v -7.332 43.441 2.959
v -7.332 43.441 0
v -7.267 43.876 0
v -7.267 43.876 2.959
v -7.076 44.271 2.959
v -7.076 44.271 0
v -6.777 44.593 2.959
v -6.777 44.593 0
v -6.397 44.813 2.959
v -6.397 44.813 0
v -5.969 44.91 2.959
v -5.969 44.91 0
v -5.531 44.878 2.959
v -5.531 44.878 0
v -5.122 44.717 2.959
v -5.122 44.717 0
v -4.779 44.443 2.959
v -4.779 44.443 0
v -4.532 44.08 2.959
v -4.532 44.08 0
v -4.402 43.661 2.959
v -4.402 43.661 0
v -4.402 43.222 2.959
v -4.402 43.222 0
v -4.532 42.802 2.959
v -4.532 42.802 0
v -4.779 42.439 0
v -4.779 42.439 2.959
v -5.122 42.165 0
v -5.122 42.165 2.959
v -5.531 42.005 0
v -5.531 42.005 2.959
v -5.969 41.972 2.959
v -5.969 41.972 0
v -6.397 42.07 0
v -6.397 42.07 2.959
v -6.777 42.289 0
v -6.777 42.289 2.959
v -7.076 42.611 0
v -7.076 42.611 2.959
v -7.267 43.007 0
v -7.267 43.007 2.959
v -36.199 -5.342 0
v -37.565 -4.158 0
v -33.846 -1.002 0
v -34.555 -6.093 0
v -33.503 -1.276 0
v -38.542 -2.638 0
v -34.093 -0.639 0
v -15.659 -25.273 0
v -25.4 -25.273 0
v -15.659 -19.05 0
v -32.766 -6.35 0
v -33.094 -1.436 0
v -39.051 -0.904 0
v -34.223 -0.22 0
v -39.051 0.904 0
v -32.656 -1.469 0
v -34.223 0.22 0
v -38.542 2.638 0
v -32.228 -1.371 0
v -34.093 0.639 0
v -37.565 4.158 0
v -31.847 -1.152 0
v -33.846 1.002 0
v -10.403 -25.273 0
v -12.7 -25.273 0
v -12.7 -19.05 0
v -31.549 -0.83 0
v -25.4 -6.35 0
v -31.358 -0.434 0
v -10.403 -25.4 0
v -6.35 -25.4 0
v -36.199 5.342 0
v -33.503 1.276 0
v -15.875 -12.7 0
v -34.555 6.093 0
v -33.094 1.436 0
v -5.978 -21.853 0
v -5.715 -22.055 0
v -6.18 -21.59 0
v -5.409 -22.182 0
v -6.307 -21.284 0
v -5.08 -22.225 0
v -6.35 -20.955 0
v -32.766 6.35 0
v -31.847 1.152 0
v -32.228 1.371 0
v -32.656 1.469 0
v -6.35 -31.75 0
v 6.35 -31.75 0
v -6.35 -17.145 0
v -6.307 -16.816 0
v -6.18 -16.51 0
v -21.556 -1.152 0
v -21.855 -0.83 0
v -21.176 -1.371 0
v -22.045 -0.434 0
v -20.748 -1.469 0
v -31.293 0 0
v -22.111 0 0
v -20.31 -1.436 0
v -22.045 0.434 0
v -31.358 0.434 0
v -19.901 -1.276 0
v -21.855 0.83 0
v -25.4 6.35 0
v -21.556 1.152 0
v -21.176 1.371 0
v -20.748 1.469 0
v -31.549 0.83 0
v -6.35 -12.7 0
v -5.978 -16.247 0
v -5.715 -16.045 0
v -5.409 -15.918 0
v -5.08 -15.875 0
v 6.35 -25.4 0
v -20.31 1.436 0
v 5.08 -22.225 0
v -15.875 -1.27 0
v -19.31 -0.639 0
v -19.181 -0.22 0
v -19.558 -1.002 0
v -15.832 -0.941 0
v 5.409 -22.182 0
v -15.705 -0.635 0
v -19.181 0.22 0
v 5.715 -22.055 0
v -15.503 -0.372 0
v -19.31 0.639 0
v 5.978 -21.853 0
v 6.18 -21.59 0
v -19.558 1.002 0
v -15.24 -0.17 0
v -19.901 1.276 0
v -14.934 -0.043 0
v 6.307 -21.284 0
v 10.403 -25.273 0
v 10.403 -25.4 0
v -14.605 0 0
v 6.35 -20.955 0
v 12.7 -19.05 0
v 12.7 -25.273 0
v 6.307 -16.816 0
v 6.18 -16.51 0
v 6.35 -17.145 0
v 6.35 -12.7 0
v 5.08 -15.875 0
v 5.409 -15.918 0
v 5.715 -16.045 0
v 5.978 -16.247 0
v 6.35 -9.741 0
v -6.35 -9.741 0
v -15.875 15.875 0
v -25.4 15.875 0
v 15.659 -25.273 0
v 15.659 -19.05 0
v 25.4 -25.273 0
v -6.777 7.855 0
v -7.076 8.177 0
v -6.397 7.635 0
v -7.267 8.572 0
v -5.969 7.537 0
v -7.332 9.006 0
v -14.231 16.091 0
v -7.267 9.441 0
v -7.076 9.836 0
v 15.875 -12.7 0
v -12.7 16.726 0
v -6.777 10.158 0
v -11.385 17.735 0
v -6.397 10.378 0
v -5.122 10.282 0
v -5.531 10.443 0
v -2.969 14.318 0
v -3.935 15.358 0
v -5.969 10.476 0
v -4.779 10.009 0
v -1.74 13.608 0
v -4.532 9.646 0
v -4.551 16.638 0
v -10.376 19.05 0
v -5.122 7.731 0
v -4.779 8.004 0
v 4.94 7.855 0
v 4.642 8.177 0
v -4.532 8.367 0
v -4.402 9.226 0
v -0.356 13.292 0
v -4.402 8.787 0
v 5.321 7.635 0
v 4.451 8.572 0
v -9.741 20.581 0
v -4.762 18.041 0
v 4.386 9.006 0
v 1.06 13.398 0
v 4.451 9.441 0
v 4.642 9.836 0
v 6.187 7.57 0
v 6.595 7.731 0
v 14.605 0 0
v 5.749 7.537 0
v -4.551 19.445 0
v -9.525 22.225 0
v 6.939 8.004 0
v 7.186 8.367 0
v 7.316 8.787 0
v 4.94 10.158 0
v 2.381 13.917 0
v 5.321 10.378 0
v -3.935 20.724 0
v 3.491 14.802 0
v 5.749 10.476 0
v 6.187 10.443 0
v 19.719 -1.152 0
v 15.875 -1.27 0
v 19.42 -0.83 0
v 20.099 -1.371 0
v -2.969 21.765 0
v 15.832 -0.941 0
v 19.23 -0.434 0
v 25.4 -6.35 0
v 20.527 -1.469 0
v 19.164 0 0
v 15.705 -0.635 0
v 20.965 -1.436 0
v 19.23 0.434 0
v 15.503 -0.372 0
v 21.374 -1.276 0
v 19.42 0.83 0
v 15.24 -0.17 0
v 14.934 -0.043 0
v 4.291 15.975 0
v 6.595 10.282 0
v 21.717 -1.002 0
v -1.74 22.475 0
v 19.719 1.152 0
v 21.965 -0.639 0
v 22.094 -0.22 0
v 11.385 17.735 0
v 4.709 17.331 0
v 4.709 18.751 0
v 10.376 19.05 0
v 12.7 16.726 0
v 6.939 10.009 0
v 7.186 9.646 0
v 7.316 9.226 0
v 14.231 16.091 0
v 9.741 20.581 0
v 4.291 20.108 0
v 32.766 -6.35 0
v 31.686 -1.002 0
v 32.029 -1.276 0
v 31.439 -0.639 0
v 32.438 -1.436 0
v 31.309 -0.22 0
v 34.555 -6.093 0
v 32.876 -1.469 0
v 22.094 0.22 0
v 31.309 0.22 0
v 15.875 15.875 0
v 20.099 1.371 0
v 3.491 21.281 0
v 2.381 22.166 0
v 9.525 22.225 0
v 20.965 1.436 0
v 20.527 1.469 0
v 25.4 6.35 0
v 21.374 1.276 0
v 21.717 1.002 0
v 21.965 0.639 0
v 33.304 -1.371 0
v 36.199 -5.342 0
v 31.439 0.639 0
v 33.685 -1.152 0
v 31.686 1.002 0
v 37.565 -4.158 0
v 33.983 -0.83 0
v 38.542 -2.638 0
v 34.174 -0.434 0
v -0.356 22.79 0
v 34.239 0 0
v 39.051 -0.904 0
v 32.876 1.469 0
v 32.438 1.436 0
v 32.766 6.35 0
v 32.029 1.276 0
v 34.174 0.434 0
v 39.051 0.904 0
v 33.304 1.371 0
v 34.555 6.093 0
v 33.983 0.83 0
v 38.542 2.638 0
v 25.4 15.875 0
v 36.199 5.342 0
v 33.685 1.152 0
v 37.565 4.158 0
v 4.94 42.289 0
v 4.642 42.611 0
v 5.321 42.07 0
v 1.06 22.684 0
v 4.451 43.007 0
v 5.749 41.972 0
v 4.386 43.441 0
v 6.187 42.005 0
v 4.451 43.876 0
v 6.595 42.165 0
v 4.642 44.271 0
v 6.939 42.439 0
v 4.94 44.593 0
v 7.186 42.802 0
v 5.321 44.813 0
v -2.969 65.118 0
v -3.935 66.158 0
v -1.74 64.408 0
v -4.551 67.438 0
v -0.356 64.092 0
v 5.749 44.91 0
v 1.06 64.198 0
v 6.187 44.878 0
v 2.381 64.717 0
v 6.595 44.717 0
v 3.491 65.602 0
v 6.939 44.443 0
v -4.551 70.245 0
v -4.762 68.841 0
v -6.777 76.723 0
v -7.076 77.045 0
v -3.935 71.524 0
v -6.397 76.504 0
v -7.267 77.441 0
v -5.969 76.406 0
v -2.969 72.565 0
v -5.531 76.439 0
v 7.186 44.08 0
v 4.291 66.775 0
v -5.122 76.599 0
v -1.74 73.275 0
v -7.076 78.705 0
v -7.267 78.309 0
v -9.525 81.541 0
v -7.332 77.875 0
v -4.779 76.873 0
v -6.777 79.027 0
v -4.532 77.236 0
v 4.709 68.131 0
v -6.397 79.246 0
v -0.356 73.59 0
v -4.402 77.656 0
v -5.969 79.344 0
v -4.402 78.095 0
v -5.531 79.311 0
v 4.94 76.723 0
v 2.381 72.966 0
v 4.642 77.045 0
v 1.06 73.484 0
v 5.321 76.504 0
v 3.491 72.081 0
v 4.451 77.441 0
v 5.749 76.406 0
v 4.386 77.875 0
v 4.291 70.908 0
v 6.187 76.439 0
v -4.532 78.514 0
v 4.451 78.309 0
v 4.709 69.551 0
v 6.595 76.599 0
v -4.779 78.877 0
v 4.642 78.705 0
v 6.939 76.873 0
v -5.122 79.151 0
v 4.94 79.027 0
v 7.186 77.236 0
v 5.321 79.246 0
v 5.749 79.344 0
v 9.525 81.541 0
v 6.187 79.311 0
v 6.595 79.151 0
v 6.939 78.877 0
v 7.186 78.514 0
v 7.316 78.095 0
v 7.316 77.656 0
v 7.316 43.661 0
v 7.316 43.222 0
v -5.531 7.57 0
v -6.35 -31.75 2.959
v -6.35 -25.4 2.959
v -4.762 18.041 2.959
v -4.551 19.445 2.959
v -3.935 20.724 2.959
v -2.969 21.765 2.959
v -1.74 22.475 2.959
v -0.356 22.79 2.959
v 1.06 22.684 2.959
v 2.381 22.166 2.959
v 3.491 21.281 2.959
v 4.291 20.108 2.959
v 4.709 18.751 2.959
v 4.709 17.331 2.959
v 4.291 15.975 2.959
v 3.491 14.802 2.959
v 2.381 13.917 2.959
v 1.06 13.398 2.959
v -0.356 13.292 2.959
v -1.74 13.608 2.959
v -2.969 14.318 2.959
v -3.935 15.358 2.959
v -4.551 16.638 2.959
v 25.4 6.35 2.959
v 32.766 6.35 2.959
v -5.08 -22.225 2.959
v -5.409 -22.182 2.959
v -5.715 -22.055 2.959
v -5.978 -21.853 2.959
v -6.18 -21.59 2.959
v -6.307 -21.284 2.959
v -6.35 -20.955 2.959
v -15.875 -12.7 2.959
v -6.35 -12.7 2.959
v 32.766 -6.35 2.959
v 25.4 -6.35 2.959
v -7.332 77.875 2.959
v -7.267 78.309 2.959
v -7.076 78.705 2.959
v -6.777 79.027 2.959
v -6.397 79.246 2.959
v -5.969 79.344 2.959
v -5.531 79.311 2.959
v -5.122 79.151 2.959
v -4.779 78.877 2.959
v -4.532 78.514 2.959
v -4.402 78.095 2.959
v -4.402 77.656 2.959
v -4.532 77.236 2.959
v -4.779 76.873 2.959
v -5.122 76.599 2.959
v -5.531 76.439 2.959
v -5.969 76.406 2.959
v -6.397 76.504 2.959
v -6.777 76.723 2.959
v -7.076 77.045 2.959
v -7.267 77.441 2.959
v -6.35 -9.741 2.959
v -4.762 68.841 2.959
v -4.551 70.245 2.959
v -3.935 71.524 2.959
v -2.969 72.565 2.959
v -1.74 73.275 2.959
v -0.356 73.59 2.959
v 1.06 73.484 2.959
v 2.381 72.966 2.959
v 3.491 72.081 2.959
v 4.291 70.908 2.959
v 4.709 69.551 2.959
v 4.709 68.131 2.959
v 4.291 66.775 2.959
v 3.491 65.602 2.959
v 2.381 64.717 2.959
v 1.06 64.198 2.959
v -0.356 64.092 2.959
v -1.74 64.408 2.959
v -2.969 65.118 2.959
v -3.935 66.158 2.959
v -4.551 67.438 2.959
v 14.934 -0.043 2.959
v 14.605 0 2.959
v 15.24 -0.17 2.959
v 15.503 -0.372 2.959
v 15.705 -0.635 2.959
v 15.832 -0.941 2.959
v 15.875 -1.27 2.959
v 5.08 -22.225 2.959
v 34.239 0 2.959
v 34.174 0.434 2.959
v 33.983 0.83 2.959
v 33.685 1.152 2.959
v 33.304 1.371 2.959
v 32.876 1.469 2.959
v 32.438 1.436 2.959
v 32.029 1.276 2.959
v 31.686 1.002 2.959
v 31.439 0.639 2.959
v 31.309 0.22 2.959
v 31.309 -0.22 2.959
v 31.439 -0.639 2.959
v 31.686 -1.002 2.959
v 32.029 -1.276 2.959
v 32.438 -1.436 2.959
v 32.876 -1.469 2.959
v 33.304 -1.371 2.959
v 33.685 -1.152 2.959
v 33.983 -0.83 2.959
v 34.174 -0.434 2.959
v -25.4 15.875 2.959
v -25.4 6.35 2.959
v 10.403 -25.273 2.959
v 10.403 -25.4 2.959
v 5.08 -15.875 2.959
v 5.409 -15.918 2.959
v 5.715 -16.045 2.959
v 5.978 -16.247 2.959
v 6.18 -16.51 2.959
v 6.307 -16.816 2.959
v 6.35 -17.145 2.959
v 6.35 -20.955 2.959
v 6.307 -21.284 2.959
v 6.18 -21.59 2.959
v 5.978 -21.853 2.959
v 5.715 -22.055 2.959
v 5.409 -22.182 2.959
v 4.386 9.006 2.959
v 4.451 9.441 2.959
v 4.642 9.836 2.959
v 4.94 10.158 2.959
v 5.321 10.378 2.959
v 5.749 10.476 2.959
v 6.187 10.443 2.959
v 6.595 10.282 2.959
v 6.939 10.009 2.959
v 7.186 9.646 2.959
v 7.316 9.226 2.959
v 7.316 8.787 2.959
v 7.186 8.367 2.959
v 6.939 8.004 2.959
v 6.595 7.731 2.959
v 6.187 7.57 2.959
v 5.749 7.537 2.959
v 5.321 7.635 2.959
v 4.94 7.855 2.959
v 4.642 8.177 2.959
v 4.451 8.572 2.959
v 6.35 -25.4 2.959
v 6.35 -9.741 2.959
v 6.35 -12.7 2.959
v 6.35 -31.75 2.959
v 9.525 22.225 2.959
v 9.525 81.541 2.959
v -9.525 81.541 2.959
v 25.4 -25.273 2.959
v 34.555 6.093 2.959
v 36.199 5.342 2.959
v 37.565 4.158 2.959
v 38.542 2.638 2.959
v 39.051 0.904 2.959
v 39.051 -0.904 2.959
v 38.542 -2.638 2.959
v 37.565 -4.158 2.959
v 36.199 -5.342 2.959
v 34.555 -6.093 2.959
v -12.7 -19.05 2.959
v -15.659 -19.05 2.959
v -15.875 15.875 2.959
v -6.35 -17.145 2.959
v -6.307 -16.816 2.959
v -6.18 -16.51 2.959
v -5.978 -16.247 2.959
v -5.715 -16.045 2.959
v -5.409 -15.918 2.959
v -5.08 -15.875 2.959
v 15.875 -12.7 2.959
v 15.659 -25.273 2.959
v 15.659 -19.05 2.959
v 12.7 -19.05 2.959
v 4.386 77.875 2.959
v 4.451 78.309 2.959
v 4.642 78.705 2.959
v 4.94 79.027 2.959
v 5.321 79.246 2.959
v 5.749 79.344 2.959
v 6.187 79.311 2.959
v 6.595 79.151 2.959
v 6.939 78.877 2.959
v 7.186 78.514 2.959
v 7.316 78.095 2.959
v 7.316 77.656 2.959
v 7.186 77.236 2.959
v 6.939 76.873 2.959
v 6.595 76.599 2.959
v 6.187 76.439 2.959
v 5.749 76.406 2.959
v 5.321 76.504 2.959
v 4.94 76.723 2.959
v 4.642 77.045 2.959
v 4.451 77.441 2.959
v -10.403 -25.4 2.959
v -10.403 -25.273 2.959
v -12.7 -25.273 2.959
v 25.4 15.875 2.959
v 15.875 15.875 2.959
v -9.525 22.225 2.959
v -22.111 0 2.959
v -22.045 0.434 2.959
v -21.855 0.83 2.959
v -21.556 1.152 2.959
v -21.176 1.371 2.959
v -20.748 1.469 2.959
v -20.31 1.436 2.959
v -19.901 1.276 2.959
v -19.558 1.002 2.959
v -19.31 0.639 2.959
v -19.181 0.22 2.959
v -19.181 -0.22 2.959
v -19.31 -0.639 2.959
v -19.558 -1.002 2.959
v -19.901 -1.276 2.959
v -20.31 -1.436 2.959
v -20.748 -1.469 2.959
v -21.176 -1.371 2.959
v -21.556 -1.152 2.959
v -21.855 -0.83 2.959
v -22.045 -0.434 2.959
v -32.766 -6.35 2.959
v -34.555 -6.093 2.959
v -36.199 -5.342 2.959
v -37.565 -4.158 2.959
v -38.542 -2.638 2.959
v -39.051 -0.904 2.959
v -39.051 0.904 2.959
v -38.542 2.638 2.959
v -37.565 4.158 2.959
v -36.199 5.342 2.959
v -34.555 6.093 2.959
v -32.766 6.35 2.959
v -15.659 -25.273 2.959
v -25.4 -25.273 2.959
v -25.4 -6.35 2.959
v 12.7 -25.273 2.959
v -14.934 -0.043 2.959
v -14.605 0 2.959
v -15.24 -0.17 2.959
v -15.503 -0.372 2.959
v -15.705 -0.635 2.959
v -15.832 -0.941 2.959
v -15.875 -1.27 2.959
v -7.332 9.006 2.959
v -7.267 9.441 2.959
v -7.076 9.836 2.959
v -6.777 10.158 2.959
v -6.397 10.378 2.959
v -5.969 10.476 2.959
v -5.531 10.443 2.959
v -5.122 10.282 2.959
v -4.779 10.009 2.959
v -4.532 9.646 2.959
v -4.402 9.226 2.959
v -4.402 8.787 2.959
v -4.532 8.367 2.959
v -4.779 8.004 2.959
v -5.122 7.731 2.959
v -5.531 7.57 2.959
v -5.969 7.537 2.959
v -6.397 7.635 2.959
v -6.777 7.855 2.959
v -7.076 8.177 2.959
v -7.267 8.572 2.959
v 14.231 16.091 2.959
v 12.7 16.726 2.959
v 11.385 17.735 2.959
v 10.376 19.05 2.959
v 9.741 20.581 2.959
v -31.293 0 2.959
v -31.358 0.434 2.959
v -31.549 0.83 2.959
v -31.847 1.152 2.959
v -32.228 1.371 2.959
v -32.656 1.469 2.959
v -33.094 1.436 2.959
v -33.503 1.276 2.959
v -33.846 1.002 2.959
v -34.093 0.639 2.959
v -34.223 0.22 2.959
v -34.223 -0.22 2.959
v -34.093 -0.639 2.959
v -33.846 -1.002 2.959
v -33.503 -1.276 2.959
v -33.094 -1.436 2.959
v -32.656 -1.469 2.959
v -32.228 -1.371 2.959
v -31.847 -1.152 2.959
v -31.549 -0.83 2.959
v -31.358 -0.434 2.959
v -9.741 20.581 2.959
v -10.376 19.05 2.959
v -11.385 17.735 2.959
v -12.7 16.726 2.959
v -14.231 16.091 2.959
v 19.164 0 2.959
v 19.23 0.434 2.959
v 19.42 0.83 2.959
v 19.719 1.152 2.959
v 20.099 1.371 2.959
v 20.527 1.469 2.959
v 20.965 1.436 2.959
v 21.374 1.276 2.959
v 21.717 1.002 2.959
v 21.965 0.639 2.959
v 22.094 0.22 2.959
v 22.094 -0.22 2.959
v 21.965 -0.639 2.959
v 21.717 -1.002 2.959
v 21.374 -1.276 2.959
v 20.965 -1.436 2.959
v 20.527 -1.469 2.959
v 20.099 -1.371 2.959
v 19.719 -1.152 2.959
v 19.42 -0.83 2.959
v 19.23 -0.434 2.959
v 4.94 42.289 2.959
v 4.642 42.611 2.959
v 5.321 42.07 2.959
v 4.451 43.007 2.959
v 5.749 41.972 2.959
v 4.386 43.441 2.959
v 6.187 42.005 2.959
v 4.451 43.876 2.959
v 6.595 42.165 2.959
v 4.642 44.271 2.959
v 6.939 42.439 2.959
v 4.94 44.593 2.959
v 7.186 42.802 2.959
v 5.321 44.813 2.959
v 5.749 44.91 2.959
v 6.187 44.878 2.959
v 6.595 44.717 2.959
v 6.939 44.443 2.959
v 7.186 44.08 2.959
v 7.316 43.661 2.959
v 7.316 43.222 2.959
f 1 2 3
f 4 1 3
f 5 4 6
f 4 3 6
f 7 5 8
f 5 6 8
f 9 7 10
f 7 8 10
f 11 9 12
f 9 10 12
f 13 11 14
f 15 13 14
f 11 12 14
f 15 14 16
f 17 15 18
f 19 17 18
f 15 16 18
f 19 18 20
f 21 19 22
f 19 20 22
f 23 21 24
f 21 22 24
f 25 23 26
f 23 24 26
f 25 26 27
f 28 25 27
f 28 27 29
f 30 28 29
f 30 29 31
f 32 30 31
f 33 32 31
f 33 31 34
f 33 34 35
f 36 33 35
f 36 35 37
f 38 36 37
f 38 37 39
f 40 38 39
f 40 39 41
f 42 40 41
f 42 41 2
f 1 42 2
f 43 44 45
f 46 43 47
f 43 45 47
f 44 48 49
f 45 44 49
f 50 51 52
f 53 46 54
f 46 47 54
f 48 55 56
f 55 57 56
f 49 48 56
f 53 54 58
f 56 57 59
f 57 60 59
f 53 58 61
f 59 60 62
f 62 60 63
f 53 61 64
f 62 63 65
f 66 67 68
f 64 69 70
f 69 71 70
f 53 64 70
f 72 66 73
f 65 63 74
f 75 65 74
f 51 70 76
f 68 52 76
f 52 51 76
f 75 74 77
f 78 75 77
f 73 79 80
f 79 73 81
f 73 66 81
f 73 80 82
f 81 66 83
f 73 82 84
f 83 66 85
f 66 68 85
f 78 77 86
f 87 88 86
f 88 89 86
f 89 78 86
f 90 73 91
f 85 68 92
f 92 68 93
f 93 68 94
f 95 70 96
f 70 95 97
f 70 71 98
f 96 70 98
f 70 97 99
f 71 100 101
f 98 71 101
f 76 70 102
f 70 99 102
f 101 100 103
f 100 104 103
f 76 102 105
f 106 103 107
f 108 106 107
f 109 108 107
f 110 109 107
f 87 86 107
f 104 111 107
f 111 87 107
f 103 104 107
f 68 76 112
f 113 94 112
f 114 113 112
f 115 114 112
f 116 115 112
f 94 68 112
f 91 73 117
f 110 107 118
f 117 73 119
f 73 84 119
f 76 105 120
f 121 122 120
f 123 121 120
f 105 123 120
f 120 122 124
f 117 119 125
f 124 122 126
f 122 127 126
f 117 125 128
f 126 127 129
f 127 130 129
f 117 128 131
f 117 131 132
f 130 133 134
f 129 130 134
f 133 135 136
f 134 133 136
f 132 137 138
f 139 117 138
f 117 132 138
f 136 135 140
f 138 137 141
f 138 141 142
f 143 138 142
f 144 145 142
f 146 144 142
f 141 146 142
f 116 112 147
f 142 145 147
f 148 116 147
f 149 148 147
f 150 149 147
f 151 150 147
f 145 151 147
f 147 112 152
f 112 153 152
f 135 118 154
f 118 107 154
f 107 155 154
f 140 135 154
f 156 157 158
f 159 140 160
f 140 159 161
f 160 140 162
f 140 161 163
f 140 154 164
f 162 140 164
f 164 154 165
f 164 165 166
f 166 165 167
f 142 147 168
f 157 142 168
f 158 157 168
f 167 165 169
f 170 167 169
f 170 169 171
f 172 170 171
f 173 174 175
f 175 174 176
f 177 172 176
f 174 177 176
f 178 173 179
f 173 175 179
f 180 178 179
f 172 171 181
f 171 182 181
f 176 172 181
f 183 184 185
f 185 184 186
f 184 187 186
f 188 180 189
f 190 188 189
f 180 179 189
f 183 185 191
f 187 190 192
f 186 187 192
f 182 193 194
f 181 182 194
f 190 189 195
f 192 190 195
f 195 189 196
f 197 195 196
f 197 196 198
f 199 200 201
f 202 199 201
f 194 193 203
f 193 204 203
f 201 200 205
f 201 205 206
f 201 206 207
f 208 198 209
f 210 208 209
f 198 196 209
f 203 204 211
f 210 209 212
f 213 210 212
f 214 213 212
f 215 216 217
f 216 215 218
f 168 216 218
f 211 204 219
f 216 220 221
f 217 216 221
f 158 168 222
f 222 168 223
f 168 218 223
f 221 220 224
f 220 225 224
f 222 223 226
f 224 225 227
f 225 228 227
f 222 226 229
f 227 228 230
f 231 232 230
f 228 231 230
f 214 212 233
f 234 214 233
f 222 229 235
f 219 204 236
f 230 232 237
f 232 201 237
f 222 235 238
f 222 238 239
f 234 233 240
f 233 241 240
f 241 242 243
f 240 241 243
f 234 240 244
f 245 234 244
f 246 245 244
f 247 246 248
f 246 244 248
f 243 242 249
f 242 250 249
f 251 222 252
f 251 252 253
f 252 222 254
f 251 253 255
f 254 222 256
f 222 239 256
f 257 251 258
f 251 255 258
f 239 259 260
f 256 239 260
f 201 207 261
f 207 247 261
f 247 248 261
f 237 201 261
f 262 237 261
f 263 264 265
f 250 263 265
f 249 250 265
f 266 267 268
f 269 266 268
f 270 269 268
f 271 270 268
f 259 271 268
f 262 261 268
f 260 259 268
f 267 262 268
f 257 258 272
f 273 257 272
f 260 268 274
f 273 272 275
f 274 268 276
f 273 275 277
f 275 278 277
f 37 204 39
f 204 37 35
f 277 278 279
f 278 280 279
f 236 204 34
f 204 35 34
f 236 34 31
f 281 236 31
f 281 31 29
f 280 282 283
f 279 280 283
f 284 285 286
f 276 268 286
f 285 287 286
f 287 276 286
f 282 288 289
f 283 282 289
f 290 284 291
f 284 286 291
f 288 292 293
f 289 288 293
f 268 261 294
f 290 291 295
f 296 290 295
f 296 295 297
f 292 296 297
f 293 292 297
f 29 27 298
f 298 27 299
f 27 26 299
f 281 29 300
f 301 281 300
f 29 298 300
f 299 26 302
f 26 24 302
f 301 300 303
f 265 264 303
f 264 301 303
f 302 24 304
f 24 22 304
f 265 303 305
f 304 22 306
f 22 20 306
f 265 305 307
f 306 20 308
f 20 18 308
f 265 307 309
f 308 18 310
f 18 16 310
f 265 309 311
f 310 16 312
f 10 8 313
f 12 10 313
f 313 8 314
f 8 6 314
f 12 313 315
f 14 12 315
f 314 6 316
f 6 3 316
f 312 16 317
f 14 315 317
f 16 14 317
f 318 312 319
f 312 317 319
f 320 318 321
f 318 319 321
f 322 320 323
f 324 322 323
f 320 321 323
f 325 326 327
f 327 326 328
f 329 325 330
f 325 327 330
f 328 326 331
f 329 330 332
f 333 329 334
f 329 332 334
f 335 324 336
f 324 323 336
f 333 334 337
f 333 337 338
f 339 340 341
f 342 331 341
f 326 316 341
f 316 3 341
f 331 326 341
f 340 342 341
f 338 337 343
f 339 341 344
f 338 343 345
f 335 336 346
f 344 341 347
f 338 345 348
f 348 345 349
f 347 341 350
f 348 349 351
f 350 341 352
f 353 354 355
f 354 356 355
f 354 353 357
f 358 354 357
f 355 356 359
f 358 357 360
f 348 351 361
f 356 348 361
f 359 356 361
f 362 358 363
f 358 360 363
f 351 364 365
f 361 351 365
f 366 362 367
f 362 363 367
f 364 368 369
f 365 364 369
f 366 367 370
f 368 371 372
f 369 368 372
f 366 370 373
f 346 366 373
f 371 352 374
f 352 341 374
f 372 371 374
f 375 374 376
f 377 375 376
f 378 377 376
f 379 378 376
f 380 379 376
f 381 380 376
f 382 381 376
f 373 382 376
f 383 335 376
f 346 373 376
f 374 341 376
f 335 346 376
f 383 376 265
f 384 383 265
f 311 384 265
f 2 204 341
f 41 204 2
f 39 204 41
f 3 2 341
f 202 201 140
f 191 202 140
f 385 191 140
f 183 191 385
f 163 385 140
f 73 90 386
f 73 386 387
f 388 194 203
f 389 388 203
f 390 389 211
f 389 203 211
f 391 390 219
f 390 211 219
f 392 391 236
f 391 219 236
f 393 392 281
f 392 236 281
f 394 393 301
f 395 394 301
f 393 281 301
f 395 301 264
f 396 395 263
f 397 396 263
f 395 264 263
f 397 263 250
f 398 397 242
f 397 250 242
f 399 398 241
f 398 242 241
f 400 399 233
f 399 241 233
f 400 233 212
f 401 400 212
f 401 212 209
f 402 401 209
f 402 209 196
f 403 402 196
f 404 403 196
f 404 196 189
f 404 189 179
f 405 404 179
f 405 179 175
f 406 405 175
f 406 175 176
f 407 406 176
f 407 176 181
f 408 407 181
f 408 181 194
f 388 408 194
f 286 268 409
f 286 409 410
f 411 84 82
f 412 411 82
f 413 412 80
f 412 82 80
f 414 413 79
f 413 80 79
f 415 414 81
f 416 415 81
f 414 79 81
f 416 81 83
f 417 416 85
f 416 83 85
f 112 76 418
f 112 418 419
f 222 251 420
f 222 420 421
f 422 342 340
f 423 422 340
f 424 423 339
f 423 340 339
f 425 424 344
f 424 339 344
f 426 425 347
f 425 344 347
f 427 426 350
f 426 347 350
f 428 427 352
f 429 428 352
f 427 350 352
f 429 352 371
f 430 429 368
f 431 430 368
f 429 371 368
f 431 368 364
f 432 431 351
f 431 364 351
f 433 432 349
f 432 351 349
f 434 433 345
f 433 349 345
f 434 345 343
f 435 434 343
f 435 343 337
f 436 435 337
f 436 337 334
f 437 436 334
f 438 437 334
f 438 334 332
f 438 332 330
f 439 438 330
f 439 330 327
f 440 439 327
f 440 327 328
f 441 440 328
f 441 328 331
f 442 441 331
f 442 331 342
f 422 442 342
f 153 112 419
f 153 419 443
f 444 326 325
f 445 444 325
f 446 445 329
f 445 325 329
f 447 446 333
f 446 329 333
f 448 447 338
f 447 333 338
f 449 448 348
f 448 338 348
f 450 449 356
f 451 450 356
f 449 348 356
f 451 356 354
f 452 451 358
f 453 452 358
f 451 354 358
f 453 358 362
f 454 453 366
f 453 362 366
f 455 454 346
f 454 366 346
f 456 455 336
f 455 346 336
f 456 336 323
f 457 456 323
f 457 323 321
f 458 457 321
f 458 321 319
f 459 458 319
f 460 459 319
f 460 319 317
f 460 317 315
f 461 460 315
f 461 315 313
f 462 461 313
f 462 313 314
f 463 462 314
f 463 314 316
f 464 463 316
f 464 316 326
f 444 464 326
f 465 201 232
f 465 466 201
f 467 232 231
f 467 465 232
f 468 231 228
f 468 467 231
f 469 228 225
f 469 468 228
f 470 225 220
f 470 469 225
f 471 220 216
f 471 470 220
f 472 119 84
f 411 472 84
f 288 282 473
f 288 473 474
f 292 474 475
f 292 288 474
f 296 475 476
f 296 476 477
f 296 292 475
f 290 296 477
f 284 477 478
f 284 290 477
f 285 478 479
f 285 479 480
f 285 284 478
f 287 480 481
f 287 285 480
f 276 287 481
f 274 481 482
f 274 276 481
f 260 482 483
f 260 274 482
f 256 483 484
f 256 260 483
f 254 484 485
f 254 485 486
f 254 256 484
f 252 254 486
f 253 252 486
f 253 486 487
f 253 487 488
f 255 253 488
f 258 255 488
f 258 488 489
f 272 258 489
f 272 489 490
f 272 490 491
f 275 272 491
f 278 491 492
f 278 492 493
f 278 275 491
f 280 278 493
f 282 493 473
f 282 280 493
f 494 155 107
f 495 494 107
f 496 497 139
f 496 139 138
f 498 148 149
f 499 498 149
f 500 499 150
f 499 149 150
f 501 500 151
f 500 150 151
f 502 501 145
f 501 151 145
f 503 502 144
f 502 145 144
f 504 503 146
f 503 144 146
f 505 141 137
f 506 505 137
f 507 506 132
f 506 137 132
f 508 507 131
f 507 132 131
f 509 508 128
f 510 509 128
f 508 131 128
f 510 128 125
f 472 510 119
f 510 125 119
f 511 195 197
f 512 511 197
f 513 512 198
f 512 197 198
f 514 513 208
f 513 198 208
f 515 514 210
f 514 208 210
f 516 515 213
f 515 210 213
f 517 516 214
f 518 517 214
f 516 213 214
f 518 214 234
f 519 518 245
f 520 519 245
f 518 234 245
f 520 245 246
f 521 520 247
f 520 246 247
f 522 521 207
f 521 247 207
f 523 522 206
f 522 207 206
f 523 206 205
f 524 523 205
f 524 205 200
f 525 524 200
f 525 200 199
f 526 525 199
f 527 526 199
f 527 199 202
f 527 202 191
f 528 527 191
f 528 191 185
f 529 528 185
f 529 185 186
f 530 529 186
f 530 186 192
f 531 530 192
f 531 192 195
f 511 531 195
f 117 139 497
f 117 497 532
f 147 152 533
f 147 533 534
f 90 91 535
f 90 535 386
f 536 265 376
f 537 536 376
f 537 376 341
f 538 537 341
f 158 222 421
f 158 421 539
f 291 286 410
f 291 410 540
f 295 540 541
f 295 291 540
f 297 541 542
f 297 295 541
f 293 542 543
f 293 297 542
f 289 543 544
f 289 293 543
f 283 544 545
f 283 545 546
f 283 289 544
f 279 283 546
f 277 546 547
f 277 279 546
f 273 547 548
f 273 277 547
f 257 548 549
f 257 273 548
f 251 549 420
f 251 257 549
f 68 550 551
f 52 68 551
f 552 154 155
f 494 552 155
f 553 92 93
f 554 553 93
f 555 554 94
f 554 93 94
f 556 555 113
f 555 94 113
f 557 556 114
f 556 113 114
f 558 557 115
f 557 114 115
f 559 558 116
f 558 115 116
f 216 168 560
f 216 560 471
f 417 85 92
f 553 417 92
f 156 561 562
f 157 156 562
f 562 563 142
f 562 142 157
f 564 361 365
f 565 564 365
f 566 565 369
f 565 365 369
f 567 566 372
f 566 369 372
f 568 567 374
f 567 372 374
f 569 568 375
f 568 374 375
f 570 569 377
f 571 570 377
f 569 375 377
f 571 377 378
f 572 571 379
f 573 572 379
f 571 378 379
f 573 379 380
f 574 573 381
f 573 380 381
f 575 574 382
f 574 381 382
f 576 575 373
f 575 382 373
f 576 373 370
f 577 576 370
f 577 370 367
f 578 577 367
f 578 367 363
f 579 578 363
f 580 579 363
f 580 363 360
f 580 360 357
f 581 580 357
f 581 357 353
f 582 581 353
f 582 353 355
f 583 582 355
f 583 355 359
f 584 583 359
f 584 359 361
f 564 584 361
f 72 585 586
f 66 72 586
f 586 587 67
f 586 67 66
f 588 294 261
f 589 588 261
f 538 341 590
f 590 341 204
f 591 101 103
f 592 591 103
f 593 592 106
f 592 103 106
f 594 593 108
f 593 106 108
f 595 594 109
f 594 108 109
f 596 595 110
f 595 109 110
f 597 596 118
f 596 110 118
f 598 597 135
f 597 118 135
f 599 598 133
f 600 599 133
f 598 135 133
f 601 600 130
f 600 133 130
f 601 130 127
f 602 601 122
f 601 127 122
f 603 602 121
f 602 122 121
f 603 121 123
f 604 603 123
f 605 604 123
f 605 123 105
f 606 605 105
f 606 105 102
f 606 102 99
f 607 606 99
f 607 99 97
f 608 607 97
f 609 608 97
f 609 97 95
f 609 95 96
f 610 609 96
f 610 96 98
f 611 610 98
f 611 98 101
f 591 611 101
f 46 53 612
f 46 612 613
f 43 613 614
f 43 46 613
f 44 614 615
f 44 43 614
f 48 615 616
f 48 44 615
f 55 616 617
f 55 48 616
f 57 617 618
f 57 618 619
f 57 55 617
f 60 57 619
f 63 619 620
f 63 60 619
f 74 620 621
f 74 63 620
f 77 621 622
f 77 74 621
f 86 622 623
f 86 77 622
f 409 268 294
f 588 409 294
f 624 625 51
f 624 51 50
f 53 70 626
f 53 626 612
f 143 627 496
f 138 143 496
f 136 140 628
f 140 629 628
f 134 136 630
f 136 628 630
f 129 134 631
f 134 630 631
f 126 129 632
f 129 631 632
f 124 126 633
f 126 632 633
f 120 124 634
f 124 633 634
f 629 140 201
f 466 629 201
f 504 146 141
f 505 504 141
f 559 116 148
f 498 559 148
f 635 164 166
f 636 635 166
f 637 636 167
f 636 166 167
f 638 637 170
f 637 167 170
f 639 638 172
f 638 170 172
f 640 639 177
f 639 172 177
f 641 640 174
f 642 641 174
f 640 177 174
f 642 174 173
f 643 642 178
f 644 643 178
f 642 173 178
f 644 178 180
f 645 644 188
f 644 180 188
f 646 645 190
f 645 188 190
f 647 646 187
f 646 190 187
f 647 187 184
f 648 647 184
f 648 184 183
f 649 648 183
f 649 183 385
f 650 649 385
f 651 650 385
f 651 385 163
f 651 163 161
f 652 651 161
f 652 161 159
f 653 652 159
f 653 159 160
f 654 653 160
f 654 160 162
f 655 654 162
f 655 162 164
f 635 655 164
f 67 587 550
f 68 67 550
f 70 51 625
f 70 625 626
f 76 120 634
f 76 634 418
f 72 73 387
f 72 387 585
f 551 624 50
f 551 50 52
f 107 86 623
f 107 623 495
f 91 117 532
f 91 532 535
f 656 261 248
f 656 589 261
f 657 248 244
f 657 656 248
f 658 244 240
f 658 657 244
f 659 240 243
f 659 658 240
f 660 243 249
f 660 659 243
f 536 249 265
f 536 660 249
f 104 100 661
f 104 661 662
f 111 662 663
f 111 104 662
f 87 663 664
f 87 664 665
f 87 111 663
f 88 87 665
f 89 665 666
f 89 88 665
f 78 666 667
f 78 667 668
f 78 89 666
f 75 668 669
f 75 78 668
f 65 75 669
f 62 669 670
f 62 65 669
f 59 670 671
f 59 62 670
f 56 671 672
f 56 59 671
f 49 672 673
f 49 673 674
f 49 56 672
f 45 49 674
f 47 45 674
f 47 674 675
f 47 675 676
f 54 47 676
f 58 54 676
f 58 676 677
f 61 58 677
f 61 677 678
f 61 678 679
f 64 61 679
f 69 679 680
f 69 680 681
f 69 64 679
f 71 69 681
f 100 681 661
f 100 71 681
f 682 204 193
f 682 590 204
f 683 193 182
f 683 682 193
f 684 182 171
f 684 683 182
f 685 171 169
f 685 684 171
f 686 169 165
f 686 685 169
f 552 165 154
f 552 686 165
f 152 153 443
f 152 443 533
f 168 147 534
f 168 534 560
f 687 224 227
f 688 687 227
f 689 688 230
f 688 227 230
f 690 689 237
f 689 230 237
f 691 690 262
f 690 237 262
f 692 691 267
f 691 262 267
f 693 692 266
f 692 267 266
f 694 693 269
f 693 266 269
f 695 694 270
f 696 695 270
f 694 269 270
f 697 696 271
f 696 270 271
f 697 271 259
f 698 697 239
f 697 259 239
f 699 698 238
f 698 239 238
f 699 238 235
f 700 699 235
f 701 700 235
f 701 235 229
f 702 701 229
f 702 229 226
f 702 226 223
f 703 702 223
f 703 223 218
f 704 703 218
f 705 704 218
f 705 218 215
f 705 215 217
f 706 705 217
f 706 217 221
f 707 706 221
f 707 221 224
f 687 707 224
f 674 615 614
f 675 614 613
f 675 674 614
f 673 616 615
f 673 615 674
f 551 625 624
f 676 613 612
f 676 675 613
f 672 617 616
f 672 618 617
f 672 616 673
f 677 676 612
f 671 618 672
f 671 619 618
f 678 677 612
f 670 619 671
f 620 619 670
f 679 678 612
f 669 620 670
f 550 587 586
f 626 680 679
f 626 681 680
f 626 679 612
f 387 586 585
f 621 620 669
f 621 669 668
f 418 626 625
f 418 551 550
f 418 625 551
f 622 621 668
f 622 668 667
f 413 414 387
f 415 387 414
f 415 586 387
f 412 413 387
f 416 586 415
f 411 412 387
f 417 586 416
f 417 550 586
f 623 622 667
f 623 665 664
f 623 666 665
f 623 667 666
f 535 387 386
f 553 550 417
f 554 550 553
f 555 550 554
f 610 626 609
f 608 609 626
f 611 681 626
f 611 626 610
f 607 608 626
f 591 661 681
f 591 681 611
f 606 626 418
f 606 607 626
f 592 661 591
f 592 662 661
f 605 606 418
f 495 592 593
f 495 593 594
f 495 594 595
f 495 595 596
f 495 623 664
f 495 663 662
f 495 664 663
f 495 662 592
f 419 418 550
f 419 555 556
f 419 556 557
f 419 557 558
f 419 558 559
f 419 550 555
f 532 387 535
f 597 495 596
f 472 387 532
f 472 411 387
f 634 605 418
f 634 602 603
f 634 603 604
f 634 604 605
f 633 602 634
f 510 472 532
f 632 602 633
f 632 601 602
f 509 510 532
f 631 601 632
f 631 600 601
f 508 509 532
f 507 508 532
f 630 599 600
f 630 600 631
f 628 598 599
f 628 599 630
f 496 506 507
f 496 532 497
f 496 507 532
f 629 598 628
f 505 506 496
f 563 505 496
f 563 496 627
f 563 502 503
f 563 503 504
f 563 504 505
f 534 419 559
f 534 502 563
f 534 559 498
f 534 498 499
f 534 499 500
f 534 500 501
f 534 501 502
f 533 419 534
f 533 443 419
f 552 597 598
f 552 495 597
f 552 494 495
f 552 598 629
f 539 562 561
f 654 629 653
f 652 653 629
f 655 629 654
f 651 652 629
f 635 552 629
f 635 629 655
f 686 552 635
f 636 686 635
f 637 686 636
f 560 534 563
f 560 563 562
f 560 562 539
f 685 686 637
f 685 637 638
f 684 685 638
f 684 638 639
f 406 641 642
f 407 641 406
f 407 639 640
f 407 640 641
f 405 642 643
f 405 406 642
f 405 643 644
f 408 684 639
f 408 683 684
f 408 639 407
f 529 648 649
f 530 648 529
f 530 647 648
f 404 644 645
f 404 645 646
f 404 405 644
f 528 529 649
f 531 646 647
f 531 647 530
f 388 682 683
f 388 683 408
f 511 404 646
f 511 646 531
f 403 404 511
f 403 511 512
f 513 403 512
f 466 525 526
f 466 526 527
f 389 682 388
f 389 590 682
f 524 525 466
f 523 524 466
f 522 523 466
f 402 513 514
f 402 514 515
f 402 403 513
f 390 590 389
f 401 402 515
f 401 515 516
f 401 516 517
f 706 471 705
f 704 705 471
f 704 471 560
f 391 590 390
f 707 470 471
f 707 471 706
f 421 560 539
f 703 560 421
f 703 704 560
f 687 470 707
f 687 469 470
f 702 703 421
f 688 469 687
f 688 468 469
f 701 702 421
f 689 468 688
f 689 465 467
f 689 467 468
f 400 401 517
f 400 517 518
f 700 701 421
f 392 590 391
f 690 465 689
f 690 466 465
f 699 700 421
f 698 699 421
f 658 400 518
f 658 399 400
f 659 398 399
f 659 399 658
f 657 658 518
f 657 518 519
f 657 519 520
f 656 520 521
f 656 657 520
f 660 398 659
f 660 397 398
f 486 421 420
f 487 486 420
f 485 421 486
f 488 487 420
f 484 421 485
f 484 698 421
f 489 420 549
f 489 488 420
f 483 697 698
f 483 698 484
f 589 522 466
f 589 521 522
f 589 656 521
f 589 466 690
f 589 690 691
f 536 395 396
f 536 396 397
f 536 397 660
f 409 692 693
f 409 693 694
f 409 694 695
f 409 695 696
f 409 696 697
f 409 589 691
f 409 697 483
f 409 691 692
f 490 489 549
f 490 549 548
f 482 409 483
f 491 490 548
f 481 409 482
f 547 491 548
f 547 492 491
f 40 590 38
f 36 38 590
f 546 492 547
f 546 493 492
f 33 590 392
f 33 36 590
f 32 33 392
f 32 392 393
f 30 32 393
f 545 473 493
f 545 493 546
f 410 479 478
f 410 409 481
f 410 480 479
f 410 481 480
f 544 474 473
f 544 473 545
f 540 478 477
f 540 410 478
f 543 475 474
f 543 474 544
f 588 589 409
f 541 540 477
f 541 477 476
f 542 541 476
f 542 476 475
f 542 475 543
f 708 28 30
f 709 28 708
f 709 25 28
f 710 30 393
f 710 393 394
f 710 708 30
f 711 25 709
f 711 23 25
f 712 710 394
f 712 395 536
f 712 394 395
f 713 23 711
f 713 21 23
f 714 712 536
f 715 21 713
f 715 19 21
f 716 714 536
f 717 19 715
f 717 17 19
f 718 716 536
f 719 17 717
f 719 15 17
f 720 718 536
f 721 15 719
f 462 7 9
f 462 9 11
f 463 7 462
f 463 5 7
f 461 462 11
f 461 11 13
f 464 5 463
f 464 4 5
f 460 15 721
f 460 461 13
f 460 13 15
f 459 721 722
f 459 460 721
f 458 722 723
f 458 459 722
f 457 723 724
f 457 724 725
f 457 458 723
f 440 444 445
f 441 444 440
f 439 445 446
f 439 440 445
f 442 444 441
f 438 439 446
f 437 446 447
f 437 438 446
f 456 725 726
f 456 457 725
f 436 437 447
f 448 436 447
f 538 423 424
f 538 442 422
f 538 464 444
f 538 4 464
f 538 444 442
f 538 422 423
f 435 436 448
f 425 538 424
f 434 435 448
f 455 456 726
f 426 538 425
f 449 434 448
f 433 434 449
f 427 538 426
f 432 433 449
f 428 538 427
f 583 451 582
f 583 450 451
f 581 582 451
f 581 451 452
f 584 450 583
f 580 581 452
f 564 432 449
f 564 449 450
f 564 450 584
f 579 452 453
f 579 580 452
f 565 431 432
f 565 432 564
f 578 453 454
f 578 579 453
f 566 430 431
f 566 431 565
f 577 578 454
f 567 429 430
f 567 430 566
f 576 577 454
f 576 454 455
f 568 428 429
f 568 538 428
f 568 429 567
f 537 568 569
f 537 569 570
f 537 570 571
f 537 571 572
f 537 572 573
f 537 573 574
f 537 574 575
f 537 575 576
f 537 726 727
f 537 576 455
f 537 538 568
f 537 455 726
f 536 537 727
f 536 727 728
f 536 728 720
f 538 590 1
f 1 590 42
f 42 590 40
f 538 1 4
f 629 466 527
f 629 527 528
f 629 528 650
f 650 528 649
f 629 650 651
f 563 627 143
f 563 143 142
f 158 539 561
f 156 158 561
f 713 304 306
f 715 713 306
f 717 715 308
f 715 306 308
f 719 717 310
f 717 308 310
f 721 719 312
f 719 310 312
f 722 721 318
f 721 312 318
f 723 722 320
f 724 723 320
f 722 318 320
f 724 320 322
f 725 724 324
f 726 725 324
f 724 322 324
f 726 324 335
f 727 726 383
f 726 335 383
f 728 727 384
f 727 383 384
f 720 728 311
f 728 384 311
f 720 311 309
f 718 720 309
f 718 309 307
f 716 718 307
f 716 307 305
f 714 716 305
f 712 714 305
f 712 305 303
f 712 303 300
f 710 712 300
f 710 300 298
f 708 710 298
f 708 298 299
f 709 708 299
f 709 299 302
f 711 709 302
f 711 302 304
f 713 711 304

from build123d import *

# Parameters (mm, degrees)
SKETCH1_R                        = 1.4732
BOSS_EXTRUDE1_DEPTH              = 2.9591
SKETCH4_W                        = 2.9591
SKETCH4_H                        = 6.35
CUT_EXTRUDE2_DEPTH               = 2.9591
BOSS_EXTRUDE5_DEPTH              = 2.9591
FILLET2_R                        = 1.27
FILLET3_R                        = 6.35
F_3_8_0_375_DIAMETER_HOLE1_D     = 9.525
F_3_8_0_375_DIAMETER_HOLE1_DEPTH = 6.35
F_3_8_0_375_DIAMETER_HOLE1_TIP   = 2.861598698
F_4_CLEARANCE_HOLE1_D            = 2.9464
F_4_CLEARANCE_HOLE1_DEPTH        = 6.35
F_4_CLEARANCE_HOLE1_TIP          = 0.885187864
F_4_CLEARANCE_HOLE2_D            = 2.9464
F_4_CLEARANCE_HOLE2_DEPTH        = 3.302
F_4_CLEARANCE_HOLE2_TIP          = 0.885187864
SKETCH23_W                       = 14.996716291
SKETCH23_H                       = 0.127
CUT_EXTRUDE4_DEPTH               = 2.9591


with BuildPart() as part:
    # Sketch1 → Boss-Extrude1 (new body)
    with BuildSketch(Plane.XY):
        with BuildLine():
            Line((6.35, -25.4), (6.35, -31.75))
            Line((6.35, -31.75), (-6.35, -31.75))
            Line((-6.35, -31.75), (-6.35, -25.4))
            Line((-6.35, -25.4), (-25.4, -25.4))
            Line((-25.4, -25.4), (-25.4, -6.35))
            Line((-25.4, -6.35), (-32.766, -6.35))
            ThreePointArc((-32.766, -6.35), (-39.116, 0), (-32.766, 6.35))
            Line((-32.766, 6.35), (-15.875, 6.35))
            Line((-15.875, 6.35), (-15.875, -12.7))
            Line((-15.875, -12.7), (-6.35, -12.7))
            Line((-6.35, -12.7), (-6.35, -9.7409))
            Line((-6.35, -9.7409), (6.35, -9.7409))
            Line((6.35, -9.7409), (6.35, -12.7))
            Line((6.35, -12.7), (15.875, -12.7))
            Line((15.875, -12.7), (15.875, 6.35))
            Line((15.875, 6.35), (32.766, 6.35))
            ThreePointArc((32.766, 6.35), (39.116, 0), (32.766, -6.35))
            Line((32.766, -6.35), (25.4, -6.35))
            Line((25.4, -6.35), (25.4, -25.4))
            Line((25.4, -25.4), (6.35, -25.4))
        make_face()
        with Locations((32.766, 0)):
            Circle(SKETCH1_R, mode=Mode.SUBTRACT)
        with Locations((-32.766, 0)):
            Circle(SKETCH1_R, mode=Mode.SUBTRACT)
        with BuildLine():
            Line((-5.08, -15.875), (5.08, -15.875))
            ThreePointArc((5.08, -15.875), (5.978025612, -16.246974388), (6.35, -17.145))
            Line((6.35, -17.145), (6.35, -20.955))
            ThreePointArc((6.35, -20.955), (5.978025612, -21.853025612), (5.08, -22.225))
            Line((5.08, -22.225), (-5.08, -22.225))
            ThreePointArc((-5.08, -22.225), (-5.978025612, -21.853025612), (-6.35, -20.955))
            Line((-6.35, -20.955), (-6.35, -17.145))
            ThreePointArc((-6.35, -17.145), (-5.978025612, -16.246974388), (-5.08, -15.875))
        make_face(mode=Mode.SUBTRACT)
    extrude(amount=BOSS_EXTRUDE1_DEPTH)

    # Sketch4 → Cut-Extrude2 (cut)
    with BuildSketch(Plane.XY.offset(2.9591)):
        with Locations((14.17955, -22.225)):
            Rectangle(SKETCH4_W, SKETCH4_H)
    cut_extrude2 = extrude(amount=-CUT_EXTRUDE2_DEPTH, mode=Mode.SUBTRACT)

    # Mirror2: Cut-Extrude2 across plane
    add(cut_extrude2.mirror(Plane(origin=(0, 0, 0), x_dir=(0, 0, 1), z_dir=(1, 0, 0))), mode=Mode.SUBTRACT)

    # Sketch10 → Boss-Extrude5 (add)
    with BuildSketch(Plane(origin=(0, 0, 0), x_dir=(-1, 0, 0), z_dir=(0, 0, -1))):
        Polygon((25.4, 6.35), (15.875, 6.35), (15.875, 0), (-15.875, 0), (-15.875, 6.35), (-25.4, 6.35), (-25.4, 15.875), (-9.525, 15.875), (-9.525, 81.541278797), (9.525, 81.541278797), (9.525, 15.875), (25.4, 15.875), align=None)
    extrude(amount=-BOSS_EXTRUDE5_DEPTH)

    # Fillet2
    fillet2_edges = [part.edges().sort_by_distance(p)[0] for p in [
        (15.875, 0, 1.47955),
        (-15.875, 0, 1.47955),
    ]]
    fillet(fillet2_edges, radius=FILLET2_R)

    # Fillet3
    fillet3_edges = [part.edges().sort_by_distance(p)[0] for p in [
        (-9.525, 15.875, 1.47955),
        (9.525, 15.875, 1.47955),
    ]]
    fillet(fillet3_edges, radius=FILLET3_R)

    # 3/8 (0.375) Diameter Hole1
    with Locations(Plane.XY.offset(2.9591)):
        with Locations((0, 68.841278797), (0, 18.041278797)):
            Hole(F_3_8_0_375_DIAMETER_HOLE1_D / 2, depth=F_3_8_0_375_DIAMETER_HOLE1_DEPTH)
            with Locations((0, 0, -(F_3_8_0_375_DIAMETER_HOLE1_DEPTH + F_3_8_0_375_DIAMETER_HOLE1_TIP / 2))):  # 118° drill point
                Cone(0, F_3_8_0_375_DIAMETER_HOLE1_D / 2, F_3_8_0_375_DIAMETER_HOLE1_TIP, mode=Mode.SUBTRACT)

    # #4 Clearance Hole1
    with Locations(Plane.XY.offset(2.9591)):
        with Locations((-5.858825791, 77.875104588), (-5.858825791, 43.441278797), (-5.858825791, 9.006498797), (5.858825791, 9.006498797), (5.858825791, 43.441278797), (5.858825791, 77.875104588)):
            Hole(F_4_CLEARANCE_HOLE1_D / 2, depth=F_4_CLEARANCE_HOLE1_DEPTH)
            with Locations((0, 0, -(F_4_CLEARANCE_HOLE1_DEPTH + F_4_CLEARANCE_HOLE1_TIP / 2))):  # 118° drill point
                Cone(0, F_4_CLEARANCE_HOLE1_D / 2, F_4_CLEARANCE_HOLE1_TIP, mode=Mode.SUBTRACT)

    # #4 Clearance Hole2
    with Locations(Plane.XY.offset(2.9591)):
        with Locations((-20.6375, 0), (20.6375, 0)):
            Hole(F_4_CLEARANCE_HOLE2_D / 2, depth=F_4_CLEARANCE_HOLE2_DEPTH)
            with Locations((0, 0, -(F_4_CLEARANCE_HOLE2_DEPTH + F_4_CLEARANCE_HOLE2_TIP / 2))):  # 118° drill point
                Cone(0, F_4_CLEARANCE_HOLE2_D / 2, F_4_CLEARANCE_HOLE2_TIP, mode=Mode.SUBTRACT)

    # Sketch23 → Cut-Extrude4 (cut)
    with BuildSketch(Plane.XY.offset(2.9591)):
        with Locations((-17.901641854, -25.3365)):
            Rectangle(SKETCH23_W, SKETCH23_H)
    cut_extrude4 = extrude(amount=-CUT_EXTRUDE4_DEPTH, mode=Mode.SUBTRACT)

    # Mirror3: Cut-Extrude4 across plane
    add(cut_extrude4.mirror(Plane(origin=(0, 0, 0), x_dir=(0, 0, 1), z_dir=(1, 0, 0))), mode=Mode.SUBTRACT)


solid = part.part
